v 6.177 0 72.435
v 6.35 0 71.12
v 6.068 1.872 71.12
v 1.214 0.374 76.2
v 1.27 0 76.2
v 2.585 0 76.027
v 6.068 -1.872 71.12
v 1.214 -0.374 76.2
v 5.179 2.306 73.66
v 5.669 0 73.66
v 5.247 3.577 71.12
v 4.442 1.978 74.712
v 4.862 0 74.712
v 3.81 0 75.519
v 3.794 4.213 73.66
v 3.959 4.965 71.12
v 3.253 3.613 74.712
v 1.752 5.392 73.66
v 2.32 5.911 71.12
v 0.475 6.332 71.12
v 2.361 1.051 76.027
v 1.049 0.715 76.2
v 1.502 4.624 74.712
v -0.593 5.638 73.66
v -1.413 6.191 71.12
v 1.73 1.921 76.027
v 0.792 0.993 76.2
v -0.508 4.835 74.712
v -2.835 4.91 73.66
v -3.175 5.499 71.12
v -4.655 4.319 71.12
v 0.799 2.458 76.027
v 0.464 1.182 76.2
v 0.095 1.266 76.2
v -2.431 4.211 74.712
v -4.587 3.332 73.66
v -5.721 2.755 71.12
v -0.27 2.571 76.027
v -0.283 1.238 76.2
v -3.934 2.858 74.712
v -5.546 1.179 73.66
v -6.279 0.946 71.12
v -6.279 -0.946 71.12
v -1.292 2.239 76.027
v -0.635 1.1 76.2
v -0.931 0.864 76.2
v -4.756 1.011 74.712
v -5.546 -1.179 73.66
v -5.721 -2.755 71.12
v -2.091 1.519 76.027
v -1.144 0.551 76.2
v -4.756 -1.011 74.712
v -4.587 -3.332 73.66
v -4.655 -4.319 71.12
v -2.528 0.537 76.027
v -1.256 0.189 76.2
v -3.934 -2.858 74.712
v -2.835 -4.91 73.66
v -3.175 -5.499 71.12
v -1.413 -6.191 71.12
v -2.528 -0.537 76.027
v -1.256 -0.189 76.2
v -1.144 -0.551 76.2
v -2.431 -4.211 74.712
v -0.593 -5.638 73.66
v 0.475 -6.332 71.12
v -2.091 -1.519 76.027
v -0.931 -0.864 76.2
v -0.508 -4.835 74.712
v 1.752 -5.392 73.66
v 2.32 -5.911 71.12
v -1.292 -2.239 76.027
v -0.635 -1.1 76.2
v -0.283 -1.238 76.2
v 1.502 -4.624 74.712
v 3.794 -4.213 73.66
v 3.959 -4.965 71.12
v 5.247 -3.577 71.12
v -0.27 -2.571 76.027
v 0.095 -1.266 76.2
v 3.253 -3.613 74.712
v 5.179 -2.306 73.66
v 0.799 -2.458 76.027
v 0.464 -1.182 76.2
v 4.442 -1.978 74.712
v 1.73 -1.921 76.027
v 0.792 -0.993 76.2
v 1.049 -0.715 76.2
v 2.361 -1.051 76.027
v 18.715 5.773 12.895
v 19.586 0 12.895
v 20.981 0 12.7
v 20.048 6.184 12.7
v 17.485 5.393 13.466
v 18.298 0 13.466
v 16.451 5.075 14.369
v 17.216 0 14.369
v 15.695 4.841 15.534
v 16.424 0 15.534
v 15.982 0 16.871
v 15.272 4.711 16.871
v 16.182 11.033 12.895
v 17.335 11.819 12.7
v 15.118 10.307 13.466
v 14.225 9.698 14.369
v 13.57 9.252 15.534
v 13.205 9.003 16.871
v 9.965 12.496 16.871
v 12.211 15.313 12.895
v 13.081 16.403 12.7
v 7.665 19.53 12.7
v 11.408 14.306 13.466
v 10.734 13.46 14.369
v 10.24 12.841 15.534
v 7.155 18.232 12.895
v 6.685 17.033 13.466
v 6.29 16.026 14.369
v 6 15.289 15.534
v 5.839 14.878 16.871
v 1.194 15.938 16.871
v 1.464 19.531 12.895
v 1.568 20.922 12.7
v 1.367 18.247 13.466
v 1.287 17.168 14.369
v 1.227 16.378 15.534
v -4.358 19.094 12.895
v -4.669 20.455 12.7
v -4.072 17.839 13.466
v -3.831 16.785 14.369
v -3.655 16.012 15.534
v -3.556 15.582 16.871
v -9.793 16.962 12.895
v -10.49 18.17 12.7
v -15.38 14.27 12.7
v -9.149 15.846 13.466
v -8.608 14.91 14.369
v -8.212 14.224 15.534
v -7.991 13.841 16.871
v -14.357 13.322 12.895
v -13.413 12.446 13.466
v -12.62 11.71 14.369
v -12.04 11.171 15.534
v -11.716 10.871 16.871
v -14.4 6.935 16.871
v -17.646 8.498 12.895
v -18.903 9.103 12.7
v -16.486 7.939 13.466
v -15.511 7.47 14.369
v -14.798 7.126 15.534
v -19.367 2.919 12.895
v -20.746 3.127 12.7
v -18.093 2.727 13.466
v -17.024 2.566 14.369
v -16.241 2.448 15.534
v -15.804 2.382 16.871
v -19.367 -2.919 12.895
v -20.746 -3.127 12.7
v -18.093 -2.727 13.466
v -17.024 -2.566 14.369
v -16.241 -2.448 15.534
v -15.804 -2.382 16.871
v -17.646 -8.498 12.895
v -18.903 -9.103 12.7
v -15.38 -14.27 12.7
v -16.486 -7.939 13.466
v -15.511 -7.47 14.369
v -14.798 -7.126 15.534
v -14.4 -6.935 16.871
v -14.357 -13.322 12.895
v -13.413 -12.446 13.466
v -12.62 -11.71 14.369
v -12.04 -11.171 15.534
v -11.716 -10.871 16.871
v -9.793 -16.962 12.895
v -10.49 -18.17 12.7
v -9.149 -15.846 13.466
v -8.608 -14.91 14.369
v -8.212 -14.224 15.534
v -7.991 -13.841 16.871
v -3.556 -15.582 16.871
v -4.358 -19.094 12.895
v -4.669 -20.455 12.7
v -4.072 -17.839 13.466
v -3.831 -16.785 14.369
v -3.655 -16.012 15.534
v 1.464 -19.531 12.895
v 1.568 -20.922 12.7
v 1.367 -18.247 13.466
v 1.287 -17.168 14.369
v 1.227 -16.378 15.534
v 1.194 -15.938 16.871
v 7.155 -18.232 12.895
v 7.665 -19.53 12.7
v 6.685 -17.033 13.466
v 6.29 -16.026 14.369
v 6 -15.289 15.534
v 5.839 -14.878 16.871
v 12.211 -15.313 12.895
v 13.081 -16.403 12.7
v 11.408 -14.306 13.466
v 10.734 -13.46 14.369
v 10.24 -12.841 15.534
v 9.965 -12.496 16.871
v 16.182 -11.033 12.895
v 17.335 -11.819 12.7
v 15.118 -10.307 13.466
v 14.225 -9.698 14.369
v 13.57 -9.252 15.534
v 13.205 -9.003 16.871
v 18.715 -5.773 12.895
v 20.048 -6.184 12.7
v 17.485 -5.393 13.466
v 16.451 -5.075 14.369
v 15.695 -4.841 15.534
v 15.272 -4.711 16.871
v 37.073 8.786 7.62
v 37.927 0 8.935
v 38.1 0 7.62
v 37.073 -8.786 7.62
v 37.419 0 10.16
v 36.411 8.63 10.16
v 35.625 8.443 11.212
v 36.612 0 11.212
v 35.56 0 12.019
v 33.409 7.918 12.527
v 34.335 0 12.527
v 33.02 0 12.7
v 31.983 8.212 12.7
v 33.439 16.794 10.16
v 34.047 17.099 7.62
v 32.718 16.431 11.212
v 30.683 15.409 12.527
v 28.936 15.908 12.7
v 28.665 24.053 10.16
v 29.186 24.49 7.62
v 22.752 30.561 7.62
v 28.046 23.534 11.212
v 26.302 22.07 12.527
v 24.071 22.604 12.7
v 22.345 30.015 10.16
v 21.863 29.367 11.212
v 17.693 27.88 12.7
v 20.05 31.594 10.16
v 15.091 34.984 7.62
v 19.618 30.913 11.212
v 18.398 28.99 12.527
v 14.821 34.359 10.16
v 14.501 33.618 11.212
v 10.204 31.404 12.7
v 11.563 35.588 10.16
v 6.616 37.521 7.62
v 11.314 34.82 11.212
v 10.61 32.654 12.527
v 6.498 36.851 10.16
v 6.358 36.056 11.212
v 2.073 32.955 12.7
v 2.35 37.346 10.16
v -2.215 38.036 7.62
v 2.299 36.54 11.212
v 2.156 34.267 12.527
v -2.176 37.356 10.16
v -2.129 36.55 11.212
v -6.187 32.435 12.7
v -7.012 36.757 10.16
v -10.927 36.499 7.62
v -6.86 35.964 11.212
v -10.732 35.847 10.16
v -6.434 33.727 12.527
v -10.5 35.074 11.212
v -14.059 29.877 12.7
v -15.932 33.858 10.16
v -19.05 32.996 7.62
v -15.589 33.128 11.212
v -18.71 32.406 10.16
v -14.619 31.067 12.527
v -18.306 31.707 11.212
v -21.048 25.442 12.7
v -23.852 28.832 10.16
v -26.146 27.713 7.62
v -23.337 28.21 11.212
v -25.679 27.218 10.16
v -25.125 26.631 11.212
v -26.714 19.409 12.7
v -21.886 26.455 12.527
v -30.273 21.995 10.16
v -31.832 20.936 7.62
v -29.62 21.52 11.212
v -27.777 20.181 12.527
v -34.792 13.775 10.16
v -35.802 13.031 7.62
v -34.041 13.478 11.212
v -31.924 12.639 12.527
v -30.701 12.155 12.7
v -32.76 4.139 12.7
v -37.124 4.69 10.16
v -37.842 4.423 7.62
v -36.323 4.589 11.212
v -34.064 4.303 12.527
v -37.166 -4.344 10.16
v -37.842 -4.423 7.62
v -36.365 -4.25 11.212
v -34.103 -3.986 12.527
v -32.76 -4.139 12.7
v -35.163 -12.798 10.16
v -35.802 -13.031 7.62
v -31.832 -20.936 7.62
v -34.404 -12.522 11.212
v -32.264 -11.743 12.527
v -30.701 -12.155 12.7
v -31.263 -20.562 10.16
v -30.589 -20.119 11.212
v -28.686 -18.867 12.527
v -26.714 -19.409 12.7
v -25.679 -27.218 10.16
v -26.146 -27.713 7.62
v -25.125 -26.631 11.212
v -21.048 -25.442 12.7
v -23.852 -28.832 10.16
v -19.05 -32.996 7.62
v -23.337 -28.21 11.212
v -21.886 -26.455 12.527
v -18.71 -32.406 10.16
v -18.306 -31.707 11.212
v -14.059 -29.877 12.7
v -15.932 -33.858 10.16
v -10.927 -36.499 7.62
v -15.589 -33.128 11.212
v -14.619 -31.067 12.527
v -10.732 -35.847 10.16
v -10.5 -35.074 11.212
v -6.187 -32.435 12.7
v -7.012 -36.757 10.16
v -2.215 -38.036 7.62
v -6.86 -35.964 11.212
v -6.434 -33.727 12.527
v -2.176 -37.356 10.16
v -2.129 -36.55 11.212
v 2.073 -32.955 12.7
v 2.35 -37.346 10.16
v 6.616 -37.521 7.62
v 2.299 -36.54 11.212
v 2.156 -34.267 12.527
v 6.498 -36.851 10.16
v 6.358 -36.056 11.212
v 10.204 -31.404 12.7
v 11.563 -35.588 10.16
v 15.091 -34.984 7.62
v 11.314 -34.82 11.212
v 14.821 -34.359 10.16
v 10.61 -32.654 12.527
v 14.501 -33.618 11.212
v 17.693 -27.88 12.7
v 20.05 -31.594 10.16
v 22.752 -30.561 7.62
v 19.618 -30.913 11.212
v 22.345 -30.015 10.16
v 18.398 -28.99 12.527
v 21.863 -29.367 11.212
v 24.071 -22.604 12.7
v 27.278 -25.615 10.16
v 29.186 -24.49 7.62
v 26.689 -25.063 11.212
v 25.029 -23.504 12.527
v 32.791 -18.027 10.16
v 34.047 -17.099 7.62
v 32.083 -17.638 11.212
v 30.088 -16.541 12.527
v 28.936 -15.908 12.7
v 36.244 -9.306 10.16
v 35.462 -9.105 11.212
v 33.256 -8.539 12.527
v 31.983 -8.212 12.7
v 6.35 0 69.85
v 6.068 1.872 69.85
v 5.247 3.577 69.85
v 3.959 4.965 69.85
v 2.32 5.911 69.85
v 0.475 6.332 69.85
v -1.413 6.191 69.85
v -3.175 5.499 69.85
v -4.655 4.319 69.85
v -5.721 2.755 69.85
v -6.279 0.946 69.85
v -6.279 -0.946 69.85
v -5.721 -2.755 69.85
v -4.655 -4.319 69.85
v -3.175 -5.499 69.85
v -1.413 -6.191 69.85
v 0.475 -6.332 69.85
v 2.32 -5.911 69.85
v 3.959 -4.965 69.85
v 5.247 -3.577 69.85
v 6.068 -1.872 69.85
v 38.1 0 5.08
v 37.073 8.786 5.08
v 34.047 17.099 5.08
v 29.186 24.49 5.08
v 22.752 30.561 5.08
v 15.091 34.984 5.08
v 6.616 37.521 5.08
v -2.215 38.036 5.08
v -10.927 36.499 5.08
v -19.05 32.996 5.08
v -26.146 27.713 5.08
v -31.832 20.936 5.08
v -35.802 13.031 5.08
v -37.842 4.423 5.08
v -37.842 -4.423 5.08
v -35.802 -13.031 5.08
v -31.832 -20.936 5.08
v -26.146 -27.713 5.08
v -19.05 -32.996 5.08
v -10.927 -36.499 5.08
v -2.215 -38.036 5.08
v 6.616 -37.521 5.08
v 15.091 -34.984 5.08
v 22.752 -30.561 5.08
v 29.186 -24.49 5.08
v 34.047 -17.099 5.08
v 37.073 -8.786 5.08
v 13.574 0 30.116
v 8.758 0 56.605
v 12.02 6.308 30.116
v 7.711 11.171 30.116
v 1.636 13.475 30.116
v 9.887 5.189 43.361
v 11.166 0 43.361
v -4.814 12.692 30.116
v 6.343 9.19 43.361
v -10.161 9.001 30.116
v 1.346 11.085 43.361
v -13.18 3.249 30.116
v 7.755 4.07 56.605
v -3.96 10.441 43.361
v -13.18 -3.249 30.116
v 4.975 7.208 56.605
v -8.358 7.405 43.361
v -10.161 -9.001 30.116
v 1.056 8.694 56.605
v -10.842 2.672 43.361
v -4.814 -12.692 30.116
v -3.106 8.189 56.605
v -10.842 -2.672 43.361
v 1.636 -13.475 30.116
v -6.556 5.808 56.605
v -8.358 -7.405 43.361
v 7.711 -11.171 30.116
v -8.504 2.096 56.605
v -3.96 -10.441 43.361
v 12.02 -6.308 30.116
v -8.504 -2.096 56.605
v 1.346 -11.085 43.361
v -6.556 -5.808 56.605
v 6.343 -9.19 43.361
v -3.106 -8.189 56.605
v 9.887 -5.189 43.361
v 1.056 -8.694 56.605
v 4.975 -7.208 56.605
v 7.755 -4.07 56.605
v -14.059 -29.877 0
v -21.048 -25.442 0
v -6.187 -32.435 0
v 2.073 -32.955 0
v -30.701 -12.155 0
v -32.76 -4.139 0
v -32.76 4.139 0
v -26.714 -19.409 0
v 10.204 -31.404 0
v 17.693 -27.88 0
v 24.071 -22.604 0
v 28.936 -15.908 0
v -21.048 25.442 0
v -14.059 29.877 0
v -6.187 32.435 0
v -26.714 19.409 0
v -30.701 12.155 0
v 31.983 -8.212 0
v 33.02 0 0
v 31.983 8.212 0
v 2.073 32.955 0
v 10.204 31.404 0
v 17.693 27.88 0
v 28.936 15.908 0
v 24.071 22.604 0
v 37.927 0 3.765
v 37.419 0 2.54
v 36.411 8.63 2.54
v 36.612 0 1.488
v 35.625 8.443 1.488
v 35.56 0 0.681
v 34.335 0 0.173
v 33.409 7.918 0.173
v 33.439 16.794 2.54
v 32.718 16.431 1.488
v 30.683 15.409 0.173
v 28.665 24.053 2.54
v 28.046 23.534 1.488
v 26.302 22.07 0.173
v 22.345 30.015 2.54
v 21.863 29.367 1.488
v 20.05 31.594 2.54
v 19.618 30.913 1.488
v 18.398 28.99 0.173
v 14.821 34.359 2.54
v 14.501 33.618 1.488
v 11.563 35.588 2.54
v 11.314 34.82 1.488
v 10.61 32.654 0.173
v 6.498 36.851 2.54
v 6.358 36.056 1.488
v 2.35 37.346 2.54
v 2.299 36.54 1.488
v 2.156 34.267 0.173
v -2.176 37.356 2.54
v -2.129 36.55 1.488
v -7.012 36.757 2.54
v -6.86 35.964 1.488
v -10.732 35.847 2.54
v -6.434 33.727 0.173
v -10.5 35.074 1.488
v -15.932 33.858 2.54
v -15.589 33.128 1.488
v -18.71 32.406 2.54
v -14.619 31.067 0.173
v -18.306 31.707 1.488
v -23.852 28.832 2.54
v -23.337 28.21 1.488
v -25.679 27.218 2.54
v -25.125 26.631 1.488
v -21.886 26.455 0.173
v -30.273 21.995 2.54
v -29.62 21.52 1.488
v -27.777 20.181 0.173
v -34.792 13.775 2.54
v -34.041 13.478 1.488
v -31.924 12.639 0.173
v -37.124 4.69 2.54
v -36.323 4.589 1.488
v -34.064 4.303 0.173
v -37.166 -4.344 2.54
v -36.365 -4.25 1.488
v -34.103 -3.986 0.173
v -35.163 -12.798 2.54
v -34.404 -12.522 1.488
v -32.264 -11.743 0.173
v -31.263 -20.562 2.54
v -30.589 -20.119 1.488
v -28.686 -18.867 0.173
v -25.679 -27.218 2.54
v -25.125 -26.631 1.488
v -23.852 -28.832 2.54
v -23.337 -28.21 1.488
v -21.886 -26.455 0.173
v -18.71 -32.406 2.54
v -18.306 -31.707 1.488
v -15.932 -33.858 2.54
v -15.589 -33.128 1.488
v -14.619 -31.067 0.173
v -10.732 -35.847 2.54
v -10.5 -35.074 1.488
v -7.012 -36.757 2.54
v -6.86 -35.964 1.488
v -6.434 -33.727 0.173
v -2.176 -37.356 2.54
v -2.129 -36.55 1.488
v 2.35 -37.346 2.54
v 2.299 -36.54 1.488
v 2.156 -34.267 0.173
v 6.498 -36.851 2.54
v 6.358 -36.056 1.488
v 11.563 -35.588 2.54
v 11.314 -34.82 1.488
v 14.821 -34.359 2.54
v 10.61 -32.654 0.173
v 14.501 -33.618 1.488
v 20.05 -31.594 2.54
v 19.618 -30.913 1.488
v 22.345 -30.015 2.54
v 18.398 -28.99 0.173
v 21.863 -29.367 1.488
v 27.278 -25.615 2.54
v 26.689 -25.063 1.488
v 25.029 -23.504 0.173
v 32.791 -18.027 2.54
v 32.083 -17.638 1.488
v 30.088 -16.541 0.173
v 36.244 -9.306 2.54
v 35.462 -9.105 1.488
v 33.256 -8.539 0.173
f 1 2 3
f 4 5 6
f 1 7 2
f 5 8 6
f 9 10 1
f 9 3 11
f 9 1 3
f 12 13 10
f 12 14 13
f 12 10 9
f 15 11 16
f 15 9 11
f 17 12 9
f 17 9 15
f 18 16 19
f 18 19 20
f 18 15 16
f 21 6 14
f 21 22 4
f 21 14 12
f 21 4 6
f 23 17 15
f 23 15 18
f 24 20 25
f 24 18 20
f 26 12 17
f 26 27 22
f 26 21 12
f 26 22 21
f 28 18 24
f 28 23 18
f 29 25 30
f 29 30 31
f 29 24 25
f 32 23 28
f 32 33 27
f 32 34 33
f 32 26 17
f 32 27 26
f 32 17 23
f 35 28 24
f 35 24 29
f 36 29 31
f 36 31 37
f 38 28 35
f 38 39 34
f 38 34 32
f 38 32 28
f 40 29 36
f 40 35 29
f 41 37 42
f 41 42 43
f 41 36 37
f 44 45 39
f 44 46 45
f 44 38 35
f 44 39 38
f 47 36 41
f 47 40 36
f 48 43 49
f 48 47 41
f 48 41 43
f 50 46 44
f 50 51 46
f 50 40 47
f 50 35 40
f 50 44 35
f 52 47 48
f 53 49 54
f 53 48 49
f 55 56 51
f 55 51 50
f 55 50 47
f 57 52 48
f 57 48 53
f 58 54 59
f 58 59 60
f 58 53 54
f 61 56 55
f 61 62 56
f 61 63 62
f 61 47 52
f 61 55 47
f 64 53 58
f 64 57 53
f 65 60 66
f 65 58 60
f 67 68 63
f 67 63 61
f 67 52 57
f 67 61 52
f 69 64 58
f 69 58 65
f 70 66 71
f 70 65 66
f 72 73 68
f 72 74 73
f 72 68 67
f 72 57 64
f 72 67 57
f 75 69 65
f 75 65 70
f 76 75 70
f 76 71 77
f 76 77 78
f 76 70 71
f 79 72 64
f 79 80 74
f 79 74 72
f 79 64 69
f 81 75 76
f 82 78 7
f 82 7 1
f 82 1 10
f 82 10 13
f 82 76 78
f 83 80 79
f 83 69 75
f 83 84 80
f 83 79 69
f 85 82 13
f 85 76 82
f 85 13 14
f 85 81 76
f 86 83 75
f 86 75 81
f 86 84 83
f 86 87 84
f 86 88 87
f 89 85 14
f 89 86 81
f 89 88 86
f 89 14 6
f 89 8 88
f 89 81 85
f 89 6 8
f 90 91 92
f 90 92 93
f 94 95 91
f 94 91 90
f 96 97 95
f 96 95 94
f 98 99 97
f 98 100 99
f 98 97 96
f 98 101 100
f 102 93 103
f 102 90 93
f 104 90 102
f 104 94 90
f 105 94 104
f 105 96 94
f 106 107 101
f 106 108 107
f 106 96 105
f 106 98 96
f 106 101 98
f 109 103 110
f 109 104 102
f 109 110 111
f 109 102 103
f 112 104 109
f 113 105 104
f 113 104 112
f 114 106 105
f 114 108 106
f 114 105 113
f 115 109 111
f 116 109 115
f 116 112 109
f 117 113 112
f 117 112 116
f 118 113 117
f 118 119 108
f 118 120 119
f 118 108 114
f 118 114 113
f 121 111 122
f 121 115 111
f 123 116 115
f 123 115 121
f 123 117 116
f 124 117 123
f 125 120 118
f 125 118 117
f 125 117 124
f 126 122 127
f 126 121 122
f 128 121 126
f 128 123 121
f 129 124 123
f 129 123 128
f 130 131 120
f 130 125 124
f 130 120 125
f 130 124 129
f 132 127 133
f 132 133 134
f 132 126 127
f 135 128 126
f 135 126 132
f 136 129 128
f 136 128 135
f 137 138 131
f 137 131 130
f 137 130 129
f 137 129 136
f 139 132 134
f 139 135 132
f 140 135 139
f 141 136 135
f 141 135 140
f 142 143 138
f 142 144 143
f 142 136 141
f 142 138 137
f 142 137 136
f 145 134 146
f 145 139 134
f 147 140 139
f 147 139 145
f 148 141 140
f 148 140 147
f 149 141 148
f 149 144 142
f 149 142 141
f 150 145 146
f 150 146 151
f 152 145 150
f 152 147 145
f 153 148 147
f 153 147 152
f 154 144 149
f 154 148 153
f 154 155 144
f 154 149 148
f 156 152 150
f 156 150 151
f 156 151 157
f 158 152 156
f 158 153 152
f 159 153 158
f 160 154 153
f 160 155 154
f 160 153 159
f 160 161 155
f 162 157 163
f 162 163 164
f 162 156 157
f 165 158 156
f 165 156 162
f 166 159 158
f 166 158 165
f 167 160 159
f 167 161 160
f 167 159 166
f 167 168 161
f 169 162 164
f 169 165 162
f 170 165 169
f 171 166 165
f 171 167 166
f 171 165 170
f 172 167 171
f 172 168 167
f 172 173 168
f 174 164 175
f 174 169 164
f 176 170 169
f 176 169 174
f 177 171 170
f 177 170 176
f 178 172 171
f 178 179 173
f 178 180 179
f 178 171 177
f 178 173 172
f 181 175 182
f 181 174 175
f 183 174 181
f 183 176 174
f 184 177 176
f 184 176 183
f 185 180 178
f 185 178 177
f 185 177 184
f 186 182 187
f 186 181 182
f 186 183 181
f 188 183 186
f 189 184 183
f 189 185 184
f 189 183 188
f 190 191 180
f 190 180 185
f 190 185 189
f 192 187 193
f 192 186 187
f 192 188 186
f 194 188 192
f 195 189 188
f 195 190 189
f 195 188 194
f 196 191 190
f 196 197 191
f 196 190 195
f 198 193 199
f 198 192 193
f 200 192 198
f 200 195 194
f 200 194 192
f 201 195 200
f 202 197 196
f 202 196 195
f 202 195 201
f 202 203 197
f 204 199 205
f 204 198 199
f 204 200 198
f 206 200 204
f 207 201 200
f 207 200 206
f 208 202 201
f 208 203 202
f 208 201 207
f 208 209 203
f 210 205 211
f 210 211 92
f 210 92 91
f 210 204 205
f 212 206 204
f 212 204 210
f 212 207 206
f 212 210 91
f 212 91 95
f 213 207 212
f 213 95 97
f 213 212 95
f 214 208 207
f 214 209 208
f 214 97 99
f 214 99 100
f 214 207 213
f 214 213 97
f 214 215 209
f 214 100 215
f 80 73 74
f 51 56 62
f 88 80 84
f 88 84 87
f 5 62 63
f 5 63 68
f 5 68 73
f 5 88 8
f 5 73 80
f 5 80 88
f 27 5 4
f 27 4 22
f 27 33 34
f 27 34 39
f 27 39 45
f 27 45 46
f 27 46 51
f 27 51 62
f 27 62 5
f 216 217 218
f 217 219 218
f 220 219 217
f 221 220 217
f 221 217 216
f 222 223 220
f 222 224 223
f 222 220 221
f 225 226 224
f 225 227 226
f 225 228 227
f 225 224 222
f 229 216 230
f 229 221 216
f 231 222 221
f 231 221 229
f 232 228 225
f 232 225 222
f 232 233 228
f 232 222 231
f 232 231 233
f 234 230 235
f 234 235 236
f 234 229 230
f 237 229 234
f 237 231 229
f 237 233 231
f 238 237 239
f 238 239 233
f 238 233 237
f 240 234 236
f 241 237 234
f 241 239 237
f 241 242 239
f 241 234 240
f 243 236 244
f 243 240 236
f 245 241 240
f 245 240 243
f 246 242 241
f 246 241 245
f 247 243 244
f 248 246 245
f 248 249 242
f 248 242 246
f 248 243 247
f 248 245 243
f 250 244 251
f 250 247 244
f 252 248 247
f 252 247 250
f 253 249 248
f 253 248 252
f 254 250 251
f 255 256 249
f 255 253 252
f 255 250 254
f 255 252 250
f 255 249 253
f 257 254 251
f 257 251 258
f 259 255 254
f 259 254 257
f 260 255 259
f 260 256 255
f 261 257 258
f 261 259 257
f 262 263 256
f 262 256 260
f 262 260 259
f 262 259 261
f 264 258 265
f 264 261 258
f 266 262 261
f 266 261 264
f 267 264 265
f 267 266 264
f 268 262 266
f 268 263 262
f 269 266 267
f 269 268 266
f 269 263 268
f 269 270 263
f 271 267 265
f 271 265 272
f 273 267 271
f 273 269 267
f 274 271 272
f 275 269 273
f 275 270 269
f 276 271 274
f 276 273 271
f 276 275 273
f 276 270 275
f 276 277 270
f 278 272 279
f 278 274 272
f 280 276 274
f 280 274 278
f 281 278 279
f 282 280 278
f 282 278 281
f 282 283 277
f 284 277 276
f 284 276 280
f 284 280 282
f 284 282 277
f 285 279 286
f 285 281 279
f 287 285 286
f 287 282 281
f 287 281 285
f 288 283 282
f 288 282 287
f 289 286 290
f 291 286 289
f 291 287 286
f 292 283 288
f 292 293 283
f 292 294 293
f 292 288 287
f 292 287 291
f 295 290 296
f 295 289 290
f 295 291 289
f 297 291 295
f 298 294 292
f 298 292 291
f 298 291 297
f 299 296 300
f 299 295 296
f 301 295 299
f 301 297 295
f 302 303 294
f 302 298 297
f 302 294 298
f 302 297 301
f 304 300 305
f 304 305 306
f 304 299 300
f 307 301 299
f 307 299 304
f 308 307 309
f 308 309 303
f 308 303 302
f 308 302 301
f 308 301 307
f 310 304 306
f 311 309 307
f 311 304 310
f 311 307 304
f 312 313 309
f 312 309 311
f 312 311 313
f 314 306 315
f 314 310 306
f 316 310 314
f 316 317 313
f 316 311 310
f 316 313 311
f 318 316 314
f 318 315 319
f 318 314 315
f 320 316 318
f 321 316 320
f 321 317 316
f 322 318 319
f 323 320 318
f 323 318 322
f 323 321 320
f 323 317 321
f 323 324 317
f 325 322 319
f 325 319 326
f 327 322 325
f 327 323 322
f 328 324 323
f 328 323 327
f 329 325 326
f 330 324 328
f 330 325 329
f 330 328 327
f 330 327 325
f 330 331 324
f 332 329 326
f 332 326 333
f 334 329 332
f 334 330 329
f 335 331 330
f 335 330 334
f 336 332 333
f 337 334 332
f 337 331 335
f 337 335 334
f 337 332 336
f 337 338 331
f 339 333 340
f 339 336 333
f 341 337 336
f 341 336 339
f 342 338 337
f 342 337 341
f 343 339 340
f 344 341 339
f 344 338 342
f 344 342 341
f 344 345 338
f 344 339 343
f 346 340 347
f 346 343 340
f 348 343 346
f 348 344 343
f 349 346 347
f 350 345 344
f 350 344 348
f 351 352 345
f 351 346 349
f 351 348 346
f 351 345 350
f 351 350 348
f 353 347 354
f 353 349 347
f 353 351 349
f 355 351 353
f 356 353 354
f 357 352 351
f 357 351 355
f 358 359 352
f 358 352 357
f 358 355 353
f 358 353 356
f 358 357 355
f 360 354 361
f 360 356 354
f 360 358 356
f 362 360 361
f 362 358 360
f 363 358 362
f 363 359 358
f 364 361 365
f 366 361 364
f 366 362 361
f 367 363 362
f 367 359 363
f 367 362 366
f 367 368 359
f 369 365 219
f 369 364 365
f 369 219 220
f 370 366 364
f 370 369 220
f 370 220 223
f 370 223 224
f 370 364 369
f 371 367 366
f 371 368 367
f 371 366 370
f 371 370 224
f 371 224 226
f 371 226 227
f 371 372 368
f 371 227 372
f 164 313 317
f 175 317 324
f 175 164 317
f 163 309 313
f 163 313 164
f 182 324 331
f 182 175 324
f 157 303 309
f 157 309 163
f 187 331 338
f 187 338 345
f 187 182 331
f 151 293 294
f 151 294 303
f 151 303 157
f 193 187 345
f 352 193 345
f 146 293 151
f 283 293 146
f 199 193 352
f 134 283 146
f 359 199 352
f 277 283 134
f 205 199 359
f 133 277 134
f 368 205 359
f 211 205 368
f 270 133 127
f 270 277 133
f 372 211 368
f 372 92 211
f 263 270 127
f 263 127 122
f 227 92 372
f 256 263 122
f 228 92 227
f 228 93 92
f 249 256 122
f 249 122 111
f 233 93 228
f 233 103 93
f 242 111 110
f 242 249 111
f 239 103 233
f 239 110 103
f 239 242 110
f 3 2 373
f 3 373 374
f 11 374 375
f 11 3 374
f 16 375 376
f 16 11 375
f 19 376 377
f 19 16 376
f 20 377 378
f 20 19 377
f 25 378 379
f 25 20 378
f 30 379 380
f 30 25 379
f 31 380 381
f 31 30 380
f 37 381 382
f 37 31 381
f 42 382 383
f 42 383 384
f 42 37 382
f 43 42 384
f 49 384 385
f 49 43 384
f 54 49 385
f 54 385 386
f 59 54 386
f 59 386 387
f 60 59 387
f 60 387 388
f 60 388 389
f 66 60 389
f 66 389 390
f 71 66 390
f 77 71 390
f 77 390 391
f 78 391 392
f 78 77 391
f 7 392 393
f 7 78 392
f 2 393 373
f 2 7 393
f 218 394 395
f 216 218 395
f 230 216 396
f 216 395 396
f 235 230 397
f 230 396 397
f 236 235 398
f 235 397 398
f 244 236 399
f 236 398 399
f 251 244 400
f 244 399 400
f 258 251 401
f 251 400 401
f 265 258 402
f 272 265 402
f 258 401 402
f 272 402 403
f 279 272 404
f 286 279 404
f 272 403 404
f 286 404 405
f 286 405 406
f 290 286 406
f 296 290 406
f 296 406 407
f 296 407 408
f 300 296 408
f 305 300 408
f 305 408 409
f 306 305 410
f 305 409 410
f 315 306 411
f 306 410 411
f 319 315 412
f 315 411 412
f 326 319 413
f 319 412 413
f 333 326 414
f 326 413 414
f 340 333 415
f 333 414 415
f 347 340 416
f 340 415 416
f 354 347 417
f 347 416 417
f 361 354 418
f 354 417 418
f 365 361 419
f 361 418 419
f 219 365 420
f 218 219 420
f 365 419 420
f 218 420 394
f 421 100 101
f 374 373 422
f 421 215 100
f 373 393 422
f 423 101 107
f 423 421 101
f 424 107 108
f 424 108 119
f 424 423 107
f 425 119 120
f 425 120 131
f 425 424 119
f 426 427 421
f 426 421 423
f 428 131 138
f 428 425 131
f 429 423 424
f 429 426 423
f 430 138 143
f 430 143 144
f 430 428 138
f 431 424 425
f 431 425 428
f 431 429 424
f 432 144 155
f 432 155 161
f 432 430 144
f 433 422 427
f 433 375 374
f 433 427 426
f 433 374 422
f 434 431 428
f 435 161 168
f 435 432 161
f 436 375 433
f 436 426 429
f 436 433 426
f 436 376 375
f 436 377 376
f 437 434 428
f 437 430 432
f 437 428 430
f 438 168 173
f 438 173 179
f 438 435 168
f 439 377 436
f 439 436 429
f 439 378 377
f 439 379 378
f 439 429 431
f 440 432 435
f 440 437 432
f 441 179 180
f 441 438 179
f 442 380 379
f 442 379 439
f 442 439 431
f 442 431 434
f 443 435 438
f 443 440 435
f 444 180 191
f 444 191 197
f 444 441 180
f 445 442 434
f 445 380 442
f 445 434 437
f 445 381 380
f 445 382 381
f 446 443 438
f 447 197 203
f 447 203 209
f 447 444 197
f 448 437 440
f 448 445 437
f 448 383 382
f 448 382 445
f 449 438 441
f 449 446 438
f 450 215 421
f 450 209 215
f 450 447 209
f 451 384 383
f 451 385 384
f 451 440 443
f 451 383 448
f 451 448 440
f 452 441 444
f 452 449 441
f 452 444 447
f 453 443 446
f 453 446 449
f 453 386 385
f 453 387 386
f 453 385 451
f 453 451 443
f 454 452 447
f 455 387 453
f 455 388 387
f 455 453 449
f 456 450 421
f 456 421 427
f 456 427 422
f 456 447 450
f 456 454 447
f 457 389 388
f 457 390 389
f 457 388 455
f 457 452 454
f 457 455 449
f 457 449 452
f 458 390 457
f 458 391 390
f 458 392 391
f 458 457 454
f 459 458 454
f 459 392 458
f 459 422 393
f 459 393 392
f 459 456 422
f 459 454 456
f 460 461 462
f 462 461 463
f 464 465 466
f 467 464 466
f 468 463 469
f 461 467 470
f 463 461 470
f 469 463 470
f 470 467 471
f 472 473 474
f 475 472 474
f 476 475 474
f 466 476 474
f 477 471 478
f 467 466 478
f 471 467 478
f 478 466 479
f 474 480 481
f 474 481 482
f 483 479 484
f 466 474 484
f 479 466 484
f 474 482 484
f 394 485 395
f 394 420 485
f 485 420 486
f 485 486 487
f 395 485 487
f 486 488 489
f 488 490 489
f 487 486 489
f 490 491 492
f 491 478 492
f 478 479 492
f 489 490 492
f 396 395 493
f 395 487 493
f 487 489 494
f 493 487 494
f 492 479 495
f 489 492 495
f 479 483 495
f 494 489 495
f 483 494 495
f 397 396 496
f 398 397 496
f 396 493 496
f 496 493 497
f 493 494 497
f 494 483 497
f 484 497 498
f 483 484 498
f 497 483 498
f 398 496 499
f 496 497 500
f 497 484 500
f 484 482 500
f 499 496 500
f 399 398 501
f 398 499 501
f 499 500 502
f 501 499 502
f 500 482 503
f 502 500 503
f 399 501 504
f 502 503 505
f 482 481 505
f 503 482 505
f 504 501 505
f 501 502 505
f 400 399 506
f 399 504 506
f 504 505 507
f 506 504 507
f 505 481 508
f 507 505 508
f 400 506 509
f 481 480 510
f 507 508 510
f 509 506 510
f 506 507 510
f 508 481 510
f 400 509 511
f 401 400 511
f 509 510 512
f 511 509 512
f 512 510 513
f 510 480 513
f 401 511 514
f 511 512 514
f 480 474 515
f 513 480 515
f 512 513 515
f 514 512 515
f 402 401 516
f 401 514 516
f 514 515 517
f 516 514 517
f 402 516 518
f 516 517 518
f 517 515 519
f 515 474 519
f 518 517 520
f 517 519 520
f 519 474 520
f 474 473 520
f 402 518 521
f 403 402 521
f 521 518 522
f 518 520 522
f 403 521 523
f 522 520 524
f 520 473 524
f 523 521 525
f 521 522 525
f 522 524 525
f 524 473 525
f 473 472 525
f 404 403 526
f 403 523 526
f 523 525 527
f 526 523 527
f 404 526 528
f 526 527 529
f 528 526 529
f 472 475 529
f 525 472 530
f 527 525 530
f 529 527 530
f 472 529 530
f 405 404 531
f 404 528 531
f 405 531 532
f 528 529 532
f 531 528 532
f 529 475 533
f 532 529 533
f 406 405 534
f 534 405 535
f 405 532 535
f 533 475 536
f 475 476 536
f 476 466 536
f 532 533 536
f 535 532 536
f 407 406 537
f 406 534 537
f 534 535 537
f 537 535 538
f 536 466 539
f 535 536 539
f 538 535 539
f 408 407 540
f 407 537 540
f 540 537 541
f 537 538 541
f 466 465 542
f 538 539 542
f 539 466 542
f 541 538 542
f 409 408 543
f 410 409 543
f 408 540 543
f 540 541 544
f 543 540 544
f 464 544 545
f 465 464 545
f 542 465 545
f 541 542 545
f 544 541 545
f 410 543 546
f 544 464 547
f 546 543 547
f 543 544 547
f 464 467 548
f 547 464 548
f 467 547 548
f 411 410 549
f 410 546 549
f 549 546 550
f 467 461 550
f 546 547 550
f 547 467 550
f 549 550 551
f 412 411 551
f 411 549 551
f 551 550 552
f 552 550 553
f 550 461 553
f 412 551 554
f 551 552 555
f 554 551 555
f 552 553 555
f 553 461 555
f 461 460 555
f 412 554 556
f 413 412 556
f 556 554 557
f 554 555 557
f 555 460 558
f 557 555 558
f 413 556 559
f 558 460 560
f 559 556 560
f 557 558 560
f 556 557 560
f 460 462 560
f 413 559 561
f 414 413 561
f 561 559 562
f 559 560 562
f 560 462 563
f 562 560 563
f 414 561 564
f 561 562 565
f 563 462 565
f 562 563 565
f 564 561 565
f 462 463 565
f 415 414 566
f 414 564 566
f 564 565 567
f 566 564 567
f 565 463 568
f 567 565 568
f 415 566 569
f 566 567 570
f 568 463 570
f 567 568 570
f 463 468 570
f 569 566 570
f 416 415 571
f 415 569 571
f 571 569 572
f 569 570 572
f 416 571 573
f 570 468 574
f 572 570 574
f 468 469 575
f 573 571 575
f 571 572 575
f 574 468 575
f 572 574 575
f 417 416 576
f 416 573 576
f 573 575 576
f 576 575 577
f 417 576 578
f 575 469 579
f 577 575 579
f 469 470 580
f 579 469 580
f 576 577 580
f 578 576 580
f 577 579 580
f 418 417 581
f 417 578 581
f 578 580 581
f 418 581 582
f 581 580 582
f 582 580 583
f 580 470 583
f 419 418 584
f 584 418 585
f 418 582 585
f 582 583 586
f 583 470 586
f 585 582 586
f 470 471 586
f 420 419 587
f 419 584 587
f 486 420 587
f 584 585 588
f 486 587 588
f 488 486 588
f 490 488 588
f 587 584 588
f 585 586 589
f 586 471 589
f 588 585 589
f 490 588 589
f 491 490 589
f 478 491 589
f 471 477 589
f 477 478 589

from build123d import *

# Parameters (mm, degrees)
F0_R     = 38.1
F1_DEPTH = 12.7
F4_R     = 5.08


with BuildPart() as f1:
    # F0 (on Top) → F1 (new body)
    with BuildSketch(Plane.XY):
        Circle(F0_R)
    extrude(amount=F1_DEPTH)

    # F2 (on Front) → F3 (revolve)
    with BuildSketch(Plane.XZ):
        Polygon((0, 69.85), (0, 12.7), (16.740909, 12.7), (6.35, 69.85), (6.35, 76.2), (0, 76.2), align=None)
    revolve(axis=Axis((0, 0, 41.275), (0, 0, 1)))

    # F4
    f4_edges = [f1.edges().sort_by_distance(p)[0] for p in [
        (-38.1, 0, 12.7),
        (-38.1, 0, 0),
        (-6.35, 0, 76.2),
        (-16.740909, 0, 12.7),
    ]]
    fillet(f4_edges, radius=F4_R)


solid = f1.part
